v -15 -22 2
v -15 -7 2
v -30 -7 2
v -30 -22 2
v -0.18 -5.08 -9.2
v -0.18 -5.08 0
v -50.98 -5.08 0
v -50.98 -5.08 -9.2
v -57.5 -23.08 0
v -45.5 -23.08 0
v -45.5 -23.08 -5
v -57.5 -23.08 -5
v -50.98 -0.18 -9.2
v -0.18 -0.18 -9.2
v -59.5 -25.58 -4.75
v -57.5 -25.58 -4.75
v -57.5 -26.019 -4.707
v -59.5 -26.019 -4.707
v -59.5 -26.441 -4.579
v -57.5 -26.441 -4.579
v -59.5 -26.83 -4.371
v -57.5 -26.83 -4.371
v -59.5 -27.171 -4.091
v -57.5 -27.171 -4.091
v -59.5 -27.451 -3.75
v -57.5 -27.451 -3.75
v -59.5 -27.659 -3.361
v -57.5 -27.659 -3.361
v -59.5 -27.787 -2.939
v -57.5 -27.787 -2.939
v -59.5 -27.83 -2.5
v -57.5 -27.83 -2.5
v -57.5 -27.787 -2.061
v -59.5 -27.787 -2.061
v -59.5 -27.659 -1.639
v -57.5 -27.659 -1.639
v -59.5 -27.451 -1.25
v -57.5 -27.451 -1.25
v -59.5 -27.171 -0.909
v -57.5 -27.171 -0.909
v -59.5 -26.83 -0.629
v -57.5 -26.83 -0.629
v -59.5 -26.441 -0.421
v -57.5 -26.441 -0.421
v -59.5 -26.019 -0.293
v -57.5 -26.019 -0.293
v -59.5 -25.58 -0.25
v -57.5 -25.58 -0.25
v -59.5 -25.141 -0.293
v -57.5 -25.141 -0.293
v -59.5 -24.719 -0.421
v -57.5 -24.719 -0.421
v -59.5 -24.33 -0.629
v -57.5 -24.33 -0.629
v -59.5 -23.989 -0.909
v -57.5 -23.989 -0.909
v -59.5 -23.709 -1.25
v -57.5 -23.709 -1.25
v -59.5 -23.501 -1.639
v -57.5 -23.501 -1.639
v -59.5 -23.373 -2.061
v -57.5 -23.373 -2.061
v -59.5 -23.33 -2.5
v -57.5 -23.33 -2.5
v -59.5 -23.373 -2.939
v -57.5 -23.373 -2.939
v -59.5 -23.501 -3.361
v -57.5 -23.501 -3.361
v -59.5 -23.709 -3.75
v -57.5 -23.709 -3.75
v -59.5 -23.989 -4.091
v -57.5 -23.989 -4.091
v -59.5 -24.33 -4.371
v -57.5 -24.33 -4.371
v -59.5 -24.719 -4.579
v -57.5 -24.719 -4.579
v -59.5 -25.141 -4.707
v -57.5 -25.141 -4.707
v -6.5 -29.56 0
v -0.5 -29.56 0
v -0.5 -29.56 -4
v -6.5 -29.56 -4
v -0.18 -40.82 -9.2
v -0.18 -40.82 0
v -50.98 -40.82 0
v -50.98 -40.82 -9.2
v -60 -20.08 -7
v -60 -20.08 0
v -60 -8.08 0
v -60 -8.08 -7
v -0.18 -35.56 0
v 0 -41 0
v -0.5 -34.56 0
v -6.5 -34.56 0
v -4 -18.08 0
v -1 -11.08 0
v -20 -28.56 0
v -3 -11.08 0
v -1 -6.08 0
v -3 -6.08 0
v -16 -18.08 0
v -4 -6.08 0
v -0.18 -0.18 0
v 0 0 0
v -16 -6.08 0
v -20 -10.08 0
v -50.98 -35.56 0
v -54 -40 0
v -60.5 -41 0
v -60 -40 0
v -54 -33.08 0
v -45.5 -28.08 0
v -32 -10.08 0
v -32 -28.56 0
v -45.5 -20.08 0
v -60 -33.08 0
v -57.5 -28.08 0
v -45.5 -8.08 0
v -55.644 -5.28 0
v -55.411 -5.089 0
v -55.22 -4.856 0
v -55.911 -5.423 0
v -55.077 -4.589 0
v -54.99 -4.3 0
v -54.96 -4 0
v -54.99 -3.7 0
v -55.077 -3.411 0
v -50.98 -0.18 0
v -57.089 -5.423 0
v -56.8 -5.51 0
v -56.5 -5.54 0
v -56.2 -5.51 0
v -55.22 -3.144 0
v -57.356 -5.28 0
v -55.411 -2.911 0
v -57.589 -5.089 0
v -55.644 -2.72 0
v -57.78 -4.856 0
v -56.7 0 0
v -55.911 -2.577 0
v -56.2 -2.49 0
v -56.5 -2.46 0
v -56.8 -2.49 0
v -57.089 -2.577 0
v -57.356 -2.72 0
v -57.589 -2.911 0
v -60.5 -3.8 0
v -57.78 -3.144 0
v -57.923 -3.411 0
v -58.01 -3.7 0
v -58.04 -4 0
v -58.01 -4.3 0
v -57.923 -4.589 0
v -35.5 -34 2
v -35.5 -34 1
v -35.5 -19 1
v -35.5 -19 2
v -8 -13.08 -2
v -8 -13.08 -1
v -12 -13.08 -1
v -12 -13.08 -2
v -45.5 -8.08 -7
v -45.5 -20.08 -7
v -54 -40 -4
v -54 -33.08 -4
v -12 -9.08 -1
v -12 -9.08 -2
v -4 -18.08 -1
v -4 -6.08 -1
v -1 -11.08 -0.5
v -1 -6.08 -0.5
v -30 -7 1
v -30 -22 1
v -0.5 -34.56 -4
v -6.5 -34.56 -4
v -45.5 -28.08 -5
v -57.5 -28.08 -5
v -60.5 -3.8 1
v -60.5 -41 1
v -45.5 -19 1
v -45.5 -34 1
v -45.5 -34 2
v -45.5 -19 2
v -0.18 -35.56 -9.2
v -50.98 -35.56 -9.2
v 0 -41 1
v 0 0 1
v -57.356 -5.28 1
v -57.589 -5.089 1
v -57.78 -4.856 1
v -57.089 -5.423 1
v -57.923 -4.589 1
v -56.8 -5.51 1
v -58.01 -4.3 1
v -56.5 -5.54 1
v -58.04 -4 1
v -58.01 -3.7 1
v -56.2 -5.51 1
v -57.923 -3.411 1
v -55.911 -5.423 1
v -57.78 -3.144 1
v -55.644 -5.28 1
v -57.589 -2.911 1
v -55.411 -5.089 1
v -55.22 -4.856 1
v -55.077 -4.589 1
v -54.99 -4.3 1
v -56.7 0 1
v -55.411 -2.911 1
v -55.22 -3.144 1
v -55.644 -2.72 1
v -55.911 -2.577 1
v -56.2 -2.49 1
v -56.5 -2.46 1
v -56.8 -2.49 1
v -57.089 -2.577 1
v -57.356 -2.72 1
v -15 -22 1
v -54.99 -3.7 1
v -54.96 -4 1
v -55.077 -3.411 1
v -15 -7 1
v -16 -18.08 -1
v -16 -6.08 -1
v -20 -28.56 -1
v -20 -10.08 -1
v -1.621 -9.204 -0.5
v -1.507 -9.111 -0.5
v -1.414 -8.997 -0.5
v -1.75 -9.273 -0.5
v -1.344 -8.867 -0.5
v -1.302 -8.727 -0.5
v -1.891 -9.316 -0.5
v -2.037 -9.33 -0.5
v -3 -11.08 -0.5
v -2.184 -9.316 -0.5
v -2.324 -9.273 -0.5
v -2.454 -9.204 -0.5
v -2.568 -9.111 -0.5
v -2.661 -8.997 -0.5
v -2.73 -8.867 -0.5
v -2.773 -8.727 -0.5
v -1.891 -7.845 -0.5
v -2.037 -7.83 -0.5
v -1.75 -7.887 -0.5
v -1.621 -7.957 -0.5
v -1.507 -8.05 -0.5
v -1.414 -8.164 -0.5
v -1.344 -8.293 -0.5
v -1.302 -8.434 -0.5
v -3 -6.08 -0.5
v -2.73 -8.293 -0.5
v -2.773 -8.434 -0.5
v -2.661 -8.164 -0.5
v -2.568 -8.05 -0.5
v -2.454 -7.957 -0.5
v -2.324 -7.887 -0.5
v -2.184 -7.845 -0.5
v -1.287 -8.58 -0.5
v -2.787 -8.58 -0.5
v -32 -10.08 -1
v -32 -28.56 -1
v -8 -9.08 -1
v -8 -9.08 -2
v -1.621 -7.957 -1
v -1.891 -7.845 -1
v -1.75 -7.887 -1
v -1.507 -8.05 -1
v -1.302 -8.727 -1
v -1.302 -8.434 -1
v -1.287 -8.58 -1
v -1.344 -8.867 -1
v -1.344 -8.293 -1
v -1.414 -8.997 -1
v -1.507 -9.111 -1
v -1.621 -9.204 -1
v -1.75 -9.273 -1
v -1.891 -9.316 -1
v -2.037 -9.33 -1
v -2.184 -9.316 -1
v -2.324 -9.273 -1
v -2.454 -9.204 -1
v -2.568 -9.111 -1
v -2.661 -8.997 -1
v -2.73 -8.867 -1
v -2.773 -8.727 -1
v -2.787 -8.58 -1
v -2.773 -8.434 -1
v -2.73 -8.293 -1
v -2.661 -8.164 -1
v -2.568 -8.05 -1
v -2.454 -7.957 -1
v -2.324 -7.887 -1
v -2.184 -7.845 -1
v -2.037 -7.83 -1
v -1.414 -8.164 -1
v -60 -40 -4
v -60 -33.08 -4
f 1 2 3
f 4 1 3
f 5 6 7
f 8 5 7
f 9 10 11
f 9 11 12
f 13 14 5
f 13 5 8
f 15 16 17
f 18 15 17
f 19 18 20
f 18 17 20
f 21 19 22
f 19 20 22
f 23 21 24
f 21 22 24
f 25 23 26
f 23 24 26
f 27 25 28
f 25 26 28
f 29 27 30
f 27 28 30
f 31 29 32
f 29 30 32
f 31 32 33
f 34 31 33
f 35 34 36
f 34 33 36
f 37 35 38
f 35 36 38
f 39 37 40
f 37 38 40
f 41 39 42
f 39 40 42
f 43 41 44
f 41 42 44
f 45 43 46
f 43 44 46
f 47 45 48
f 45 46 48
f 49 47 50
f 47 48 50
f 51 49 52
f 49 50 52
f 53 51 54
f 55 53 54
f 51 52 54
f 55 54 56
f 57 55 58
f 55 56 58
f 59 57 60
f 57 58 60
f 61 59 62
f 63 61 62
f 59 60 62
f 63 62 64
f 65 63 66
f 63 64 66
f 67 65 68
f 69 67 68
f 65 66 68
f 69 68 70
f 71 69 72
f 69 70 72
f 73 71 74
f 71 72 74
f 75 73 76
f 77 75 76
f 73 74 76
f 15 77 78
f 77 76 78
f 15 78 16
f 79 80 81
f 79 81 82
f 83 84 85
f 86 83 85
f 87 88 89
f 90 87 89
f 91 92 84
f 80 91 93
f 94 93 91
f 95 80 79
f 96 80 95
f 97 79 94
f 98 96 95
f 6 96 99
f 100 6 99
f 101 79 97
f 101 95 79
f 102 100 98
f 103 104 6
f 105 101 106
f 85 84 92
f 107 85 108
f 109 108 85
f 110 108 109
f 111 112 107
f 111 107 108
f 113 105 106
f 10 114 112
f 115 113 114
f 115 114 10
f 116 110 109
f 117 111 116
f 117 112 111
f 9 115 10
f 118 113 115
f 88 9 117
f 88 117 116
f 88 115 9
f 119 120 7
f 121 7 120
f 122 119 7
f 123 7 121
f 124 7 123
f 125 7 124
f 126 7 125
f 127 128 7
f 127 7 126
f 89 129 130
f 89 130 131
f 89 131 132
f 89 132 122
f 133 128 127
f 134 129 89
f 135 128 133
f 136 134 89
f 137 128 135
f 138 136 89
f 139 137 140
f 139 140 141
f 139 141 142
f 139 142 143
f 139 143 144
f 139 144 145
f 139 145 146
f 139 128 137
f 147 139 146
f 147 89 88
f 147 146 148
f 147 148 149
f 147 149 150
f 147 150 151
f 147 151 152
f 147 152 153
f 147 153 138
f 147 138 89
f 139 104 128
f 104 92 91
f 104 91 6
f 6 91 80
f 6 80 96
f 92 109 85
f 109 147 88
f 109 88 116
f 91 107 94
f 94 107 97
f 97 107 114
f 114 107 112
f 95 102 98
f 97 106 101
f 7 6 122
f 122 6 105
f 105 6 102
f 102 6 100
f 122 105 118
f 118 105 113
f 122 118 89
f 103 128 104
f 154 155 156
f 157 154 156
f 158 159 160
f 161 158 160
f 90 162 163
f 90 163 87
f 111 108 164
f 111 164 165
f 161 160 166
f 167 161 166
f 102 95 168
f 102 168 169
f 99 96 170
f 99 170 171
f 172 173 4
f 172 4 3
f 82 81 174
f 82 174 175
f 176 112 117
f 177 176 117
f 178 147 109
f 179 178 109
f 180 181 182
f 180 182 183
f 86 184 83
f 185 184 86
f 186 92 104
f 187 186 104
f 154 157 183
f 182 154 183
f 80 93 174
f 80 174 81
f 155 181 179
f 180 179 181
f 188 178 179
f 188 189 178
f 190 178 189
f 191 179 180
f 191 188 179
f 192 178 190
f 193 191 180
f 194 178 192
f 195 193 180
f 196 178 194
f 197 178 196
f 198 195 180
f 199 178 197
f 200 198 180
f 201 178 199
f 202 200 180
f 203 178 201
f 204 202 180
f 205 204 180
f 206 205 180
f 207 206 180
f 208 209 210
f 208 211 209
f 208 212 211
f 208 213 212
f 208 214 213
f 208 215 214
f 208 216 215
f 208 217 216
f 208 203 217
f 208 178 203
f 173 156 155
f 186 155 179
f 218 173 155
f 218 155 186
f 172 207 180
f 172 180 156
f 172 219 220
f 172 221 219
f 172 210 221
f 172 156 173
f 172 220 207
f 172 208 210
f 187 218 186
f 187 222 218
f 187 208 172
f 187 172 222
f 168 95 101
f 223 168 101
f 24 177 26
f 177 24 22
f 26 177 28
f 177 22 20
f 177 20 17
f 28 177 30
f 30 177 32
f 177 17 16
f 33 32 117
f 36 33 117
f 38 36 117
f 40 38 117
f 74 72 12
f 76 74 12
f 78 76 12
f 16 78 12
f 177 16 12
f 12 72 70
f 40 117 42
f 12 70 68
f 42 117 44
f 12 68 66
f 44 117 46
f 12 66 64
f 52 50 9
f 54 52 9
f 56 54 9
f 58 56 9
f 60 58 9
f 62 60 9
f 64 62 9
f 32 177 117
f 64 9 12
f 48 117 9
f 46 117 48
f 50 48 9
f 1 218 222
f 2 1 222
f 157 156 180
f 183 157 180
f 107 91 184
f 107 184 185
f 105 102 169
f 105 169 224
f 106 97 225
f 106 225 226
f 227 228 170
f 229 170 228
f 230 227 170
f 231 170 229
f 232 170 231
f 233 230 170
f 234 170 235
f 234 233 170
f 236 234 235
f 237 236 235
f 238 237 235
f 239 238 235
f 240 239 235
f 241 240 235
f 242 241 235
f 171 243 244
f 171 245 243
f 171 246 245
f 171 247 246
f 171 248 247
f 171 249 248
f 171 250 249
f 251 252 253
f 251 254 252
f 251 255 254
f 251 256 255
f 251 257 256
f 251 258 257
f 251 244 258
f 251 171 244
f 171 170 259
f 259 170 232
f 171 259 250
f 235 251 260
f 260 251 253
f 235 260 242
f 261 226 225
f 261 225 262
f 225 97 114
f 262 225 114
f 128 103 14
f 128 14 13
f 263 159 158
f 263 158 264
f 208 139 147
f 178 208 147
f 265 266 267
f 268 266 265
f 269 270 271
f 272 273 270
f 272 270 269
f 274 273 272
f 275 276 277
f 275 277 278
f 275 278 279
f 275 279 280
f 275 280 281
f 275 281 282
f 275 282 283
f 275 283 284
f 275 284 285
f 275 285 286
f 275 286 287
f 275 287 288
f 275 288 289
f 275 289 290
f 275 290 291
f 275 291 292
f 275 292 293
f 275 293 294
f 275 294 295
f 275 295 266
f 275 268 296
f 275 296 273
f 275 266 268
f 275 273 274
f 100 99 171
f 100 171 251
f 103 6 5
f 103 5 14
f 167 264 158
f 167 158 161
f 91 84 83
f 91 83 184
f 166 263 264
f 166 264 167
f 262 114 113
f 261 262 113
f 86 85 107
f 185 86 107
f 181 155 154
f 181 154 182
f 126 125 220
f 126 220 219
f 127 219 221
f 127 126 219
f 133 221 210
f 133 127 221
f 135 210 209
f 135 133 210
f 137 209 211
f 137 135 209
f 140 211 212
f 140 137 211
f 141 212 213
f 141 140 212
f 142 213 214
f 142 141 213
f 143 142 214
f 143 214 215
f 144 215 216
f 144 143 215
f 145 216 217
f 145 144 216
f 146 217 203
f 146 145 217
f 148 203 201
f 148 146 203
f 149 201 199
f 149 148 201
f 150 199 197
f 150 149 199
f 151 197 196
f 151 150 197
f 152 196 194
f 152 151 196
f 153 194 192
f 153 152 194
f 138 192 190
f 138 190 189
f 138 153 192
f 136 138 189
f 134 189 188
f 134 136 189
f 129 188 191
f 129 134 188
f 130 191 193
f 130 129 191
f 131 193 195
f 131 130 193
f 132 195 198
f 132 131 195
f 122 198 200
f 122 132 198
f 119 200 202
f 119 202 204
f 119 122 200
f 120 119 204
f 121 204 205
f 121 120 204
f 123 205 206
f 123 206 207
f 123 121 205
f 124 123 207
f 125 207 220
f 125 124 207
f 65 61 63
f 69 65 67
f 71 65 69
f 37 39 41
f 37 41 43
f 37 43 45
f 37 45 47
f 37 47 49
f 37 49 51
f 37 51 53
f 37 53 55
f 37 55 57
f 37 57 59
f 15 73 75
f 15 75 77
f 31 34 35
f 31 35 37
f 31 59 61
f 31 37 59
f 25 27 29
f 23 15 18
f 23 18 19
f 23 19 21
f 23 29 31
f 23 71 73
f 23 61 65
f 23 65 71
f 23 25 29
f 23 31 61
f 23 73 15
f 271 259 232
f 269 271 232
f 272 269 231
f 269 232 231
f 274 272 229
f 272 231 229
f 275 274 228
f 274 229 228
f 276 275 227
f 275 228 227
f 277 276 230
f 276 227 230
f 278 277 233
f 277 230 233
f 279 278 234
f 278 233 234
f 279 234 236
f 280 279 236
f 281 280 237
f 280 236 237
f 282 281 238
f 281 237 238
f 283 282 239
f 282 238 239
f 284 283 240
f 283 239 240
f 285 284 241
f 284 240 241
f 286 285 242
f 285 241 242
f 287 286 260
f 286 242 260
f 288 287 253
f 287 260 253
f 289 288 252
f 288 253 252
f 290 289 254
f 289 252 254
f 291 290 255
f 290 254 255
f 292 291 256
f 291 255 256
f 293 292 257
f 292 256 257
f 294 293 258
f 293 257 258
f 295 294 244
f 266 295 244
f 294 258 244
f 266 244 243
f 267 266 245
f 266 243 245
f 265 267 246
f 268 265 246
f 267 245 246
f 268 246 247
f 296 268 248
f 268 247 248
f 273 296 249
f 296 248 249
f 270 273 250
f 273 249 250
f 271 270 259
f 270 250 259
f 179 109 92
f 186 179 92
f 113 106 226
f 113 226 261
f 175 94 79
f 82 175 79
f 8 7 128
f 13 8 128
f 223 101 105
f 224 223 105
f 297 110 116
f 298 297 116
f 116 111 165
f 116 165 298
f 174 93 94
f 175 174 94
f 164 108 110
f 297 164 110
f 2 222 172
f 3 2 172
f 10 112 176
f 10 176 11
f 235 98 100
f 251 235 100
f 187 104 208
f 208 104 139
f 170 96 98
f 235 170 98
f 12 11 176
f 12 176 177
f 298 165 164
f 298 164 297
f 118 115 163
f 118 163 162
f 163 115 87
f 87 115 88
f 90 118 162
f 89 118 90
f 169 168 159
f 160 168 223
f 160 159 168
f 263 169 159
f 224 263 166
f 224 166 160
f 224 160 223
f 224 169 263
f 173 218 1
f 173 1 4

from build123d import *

# Parameters (mm, degrees)
SKETCH1_R            = 1.54
BOSS_EXTRUDE1_DEPTH  = 1
SKETCH2_W            = 15
SKETCH2_H            = 15
BOSS_EXTRUDE2_DEPTH  = 2
SKETCH3_W            = 10
SKETCH3_H            = 15
BOSS_EXTRUDE3_DEPTH  = 2
SKETCH4_W            = 50.8
SKETCH4_H            = 5.26
SKETCH4_H_2          = 4.9
BOSS_EXTRUDE4_DEPTH  = 9.2
SKETCH5_W            = 14.5
SKETCH5_H            = 12
BOSS_EXTRUDE6_DEPTH  = 7
SKETCH6_W            = 12
SKETCH6_H            = 5
BOSS_EXTRUDE7_DEPTH  = 5
SKETCH7_R            = 2.25
BOSS_EXTRUDE8_DEPTH  = 2
SKETCH8_W            = 6
SKETCH8_H            = 6.92
BOSS_EXTRUDE9_DEPTH  = 4
SKETCH9_W            = 6
SKETCH9_H            = 5
BOSS_EXTRUDE10_DEPTH = 4
SKETCH10_W           = 12
SKETCH10_H           = 18.48
BOSS_EXTRUDE11_DEPTH = 1
SKETCH11_W           = 12
SKETCH11_H           = 12
BOSS_EXTRUDE12_DEPTH = 1
SKETCH12_W           = 4
SKETCH12_H           = 4
BOSS_EXTRUDE13_DEPTH = 1
SKETCH13_W           = 2
SKETCH13_H           = 5
BOSS_EXTRUDE14_DEPTH = 0.5
SKETCH14_R           = 0.75
BOSS_EXTRUDE15_DEPTH = 0.5


with BuildPart() as part:
    # Sketch1 → Boss-Extrude1 (new body)
    with BuildSketch(Plane.XY):
        Polygon((0, 0), (-56.7, 0), (-60.5, -3.8), (-60.5, -41), (0, -41), align=None)
        with Locations((-56.5, -4)):
            Circle(SKETCH1_R, mode=Mode.SUBTRACT)
    extrude(amount=BOSS_EXTRUDE1_DEPTH)

    # Sketch2 → Boss-Extrude2 (add)
    with BuildSketch(Plane(origin=(0, 0, 0), x_dir=(-1, 0, 0), z_dir=(0, 0, -1))):
        with Locations((22.5, -14.5)):
            Rectangle(SKETCH2_W, SKETCH2_H)
    extrude(amount=-BOSS_EXTRUDE2_DEPTH)

    # Sketch3 → Boss-Extrude3 (add)
    with BuildSketch(Plane(origin=(0, 0, 0), x_dir=(-1, 0, 0), z_dir=(0, 0, -1))):
        with Locations((40.5, -26.5)):
            Rectangle(SKETCH3_W, SKETCH3_H)
    extrude(amount=-BOSS_EXTRUDE3_DEPTH)

    # Sketch4 → Boss-Extrude4 (add)
    with BuildSketch(Plane(origin=(0, 0, 0), x_dir=(-1, 0, 0), z_dir=(0, 0, -1))):
        with Locations((25.58, -38.19)):
            Rectangle(SKETCH4_W, SKETCH4_H)
        with Locations((25.58, -2.63)):
            Rectangle(SKETCH4_W, SKETCH4_H_2)
    extrude(amount=BOSS_EXTRUDE4_DEPTH)

    # Sketch5 → Boss-Extrude6 (add)
    with BuildSketch(Plane(origin=(0, 0, 0), x_dir=(-1, 0, 0), z_dir=(0, 0, -1))):
        with Locations((52.75, -14.08)):
            Rectangle(SKETCH5_W, SKETCH5_H)
    extrude(amount=BOSS_EXTRUDE6_DEPTH)

    # Sketch6 → Boss-Extrude7 (add)
    with BuildSketch(Plane(origin=(0, 0, 0), x_dir=(-1, 0, 0), z_dir=(0, 0, -1))):
        with Locations((51.5, -25.58)):
            Rectangle(SKETCH6_W, SKETCH6_H)
    extrude(amount=BOSS_EXTRUDE7_DEPTH)

    # Sketch7 → Boss-Extrude8 (add)
    with BuildSketch(Plane.ZY.offset(57.5)):
        with Locations(Location((-2.5, -25.58, 0), (0, 0, 180))):
            Circle(SKETCH7_R)
    extrude(amount=BOSS_EXTRUDE8_DEPTH)

    # Sketch8 → Boss-Extrude9 (add)
    with BuildSketch(Plane(origin=(0, 0, 0), x_dir=(-1, 0, 0), z_dir=(0, 0, -1))):
        with Locations((57, -36.54)):
            Rectangle(SKETCH8_W, SKETCH8_H)
    extrude(amount=BOSS_EXTRUDE9_DEPTH)

    # Sketch9 → Boss-Extrude10 (add)
    with BuildSketch(Plane(origin=(0, 0, 0), x_dir=(-1, 0, 0), z_dir=(0, 0, -1))):
        with Locations((3.5, -32.06)):
            Rectangle(SKETCH9_W, SKETCH9_H)
    extrude(amount=BOSS_EXTRUDE10_DEPTH)

    # Sketch10 → Boss-Extrude11 (add)
    with BuildSketch(Plane(origin=(0, 0, 0), x_dir=(-1, 0, 0), z_dir=(0, 0, -1))):
        with Locations((26, -19.32)):
            Rectangle(SKETCH10_W, SKETCH10_H)
    extrude(amount=BOSS_EXTRUDE11_DEPTH)

    # Sketch11 → Boss-Extrude12 (add)
    with BuildSketch(Plane(origin=(0, 0, 0), x_dir=(-1, 0, 0), z_dir=(0, 0, -1))):
        with Locations((10, -12.08)):
            Rectangle(SKETCH11_W, SKETCH11_H)
    extrude(amount=BOSS_EXTRUDE12_DEPTH)

    # Sketch12 → Boss-Extrude13 (add)
    with BuildSketch(Plane(origin=(0, 0, -1), x_dir=(-1, 0, 0), z_dir=(0, 0, -1))):
        with Locations((10, -11.08)):
            Rectangle(SKETCH12_W, SKETCH12_H)
    extrude(amount=BOSS_EXTRUDE13_DEPTH)

    # Sketch13 → Boss-Extrude14 (add)
    with BuildSketch(Plane(origin=(0, 0, 0), x_dir=(-1, 0, 0), z_dir=(0, 0, -1))):
        with Locations((2, -8.58)):
            Rectangle(SKETCH13_W, SKETCH13_H)
    extrude(amount=BOSS_EXTRUDE14_DEPTH)

    # Sketch14 → Boss-Extrude15 (add)
    with BuildSketch(Plane(origin=(0, 0, -0.5), x_dir=(-1, 0, 0), z_dir=(0, 0, -1))):
        with Locations(Location((2.037351084, -8.580279036, 0), (0, 0, 180))):
            Circle(SKETCH14_R)
    extrude(amount=BOSS_EXTRUDE15_DEPTH)


solid = part.part
